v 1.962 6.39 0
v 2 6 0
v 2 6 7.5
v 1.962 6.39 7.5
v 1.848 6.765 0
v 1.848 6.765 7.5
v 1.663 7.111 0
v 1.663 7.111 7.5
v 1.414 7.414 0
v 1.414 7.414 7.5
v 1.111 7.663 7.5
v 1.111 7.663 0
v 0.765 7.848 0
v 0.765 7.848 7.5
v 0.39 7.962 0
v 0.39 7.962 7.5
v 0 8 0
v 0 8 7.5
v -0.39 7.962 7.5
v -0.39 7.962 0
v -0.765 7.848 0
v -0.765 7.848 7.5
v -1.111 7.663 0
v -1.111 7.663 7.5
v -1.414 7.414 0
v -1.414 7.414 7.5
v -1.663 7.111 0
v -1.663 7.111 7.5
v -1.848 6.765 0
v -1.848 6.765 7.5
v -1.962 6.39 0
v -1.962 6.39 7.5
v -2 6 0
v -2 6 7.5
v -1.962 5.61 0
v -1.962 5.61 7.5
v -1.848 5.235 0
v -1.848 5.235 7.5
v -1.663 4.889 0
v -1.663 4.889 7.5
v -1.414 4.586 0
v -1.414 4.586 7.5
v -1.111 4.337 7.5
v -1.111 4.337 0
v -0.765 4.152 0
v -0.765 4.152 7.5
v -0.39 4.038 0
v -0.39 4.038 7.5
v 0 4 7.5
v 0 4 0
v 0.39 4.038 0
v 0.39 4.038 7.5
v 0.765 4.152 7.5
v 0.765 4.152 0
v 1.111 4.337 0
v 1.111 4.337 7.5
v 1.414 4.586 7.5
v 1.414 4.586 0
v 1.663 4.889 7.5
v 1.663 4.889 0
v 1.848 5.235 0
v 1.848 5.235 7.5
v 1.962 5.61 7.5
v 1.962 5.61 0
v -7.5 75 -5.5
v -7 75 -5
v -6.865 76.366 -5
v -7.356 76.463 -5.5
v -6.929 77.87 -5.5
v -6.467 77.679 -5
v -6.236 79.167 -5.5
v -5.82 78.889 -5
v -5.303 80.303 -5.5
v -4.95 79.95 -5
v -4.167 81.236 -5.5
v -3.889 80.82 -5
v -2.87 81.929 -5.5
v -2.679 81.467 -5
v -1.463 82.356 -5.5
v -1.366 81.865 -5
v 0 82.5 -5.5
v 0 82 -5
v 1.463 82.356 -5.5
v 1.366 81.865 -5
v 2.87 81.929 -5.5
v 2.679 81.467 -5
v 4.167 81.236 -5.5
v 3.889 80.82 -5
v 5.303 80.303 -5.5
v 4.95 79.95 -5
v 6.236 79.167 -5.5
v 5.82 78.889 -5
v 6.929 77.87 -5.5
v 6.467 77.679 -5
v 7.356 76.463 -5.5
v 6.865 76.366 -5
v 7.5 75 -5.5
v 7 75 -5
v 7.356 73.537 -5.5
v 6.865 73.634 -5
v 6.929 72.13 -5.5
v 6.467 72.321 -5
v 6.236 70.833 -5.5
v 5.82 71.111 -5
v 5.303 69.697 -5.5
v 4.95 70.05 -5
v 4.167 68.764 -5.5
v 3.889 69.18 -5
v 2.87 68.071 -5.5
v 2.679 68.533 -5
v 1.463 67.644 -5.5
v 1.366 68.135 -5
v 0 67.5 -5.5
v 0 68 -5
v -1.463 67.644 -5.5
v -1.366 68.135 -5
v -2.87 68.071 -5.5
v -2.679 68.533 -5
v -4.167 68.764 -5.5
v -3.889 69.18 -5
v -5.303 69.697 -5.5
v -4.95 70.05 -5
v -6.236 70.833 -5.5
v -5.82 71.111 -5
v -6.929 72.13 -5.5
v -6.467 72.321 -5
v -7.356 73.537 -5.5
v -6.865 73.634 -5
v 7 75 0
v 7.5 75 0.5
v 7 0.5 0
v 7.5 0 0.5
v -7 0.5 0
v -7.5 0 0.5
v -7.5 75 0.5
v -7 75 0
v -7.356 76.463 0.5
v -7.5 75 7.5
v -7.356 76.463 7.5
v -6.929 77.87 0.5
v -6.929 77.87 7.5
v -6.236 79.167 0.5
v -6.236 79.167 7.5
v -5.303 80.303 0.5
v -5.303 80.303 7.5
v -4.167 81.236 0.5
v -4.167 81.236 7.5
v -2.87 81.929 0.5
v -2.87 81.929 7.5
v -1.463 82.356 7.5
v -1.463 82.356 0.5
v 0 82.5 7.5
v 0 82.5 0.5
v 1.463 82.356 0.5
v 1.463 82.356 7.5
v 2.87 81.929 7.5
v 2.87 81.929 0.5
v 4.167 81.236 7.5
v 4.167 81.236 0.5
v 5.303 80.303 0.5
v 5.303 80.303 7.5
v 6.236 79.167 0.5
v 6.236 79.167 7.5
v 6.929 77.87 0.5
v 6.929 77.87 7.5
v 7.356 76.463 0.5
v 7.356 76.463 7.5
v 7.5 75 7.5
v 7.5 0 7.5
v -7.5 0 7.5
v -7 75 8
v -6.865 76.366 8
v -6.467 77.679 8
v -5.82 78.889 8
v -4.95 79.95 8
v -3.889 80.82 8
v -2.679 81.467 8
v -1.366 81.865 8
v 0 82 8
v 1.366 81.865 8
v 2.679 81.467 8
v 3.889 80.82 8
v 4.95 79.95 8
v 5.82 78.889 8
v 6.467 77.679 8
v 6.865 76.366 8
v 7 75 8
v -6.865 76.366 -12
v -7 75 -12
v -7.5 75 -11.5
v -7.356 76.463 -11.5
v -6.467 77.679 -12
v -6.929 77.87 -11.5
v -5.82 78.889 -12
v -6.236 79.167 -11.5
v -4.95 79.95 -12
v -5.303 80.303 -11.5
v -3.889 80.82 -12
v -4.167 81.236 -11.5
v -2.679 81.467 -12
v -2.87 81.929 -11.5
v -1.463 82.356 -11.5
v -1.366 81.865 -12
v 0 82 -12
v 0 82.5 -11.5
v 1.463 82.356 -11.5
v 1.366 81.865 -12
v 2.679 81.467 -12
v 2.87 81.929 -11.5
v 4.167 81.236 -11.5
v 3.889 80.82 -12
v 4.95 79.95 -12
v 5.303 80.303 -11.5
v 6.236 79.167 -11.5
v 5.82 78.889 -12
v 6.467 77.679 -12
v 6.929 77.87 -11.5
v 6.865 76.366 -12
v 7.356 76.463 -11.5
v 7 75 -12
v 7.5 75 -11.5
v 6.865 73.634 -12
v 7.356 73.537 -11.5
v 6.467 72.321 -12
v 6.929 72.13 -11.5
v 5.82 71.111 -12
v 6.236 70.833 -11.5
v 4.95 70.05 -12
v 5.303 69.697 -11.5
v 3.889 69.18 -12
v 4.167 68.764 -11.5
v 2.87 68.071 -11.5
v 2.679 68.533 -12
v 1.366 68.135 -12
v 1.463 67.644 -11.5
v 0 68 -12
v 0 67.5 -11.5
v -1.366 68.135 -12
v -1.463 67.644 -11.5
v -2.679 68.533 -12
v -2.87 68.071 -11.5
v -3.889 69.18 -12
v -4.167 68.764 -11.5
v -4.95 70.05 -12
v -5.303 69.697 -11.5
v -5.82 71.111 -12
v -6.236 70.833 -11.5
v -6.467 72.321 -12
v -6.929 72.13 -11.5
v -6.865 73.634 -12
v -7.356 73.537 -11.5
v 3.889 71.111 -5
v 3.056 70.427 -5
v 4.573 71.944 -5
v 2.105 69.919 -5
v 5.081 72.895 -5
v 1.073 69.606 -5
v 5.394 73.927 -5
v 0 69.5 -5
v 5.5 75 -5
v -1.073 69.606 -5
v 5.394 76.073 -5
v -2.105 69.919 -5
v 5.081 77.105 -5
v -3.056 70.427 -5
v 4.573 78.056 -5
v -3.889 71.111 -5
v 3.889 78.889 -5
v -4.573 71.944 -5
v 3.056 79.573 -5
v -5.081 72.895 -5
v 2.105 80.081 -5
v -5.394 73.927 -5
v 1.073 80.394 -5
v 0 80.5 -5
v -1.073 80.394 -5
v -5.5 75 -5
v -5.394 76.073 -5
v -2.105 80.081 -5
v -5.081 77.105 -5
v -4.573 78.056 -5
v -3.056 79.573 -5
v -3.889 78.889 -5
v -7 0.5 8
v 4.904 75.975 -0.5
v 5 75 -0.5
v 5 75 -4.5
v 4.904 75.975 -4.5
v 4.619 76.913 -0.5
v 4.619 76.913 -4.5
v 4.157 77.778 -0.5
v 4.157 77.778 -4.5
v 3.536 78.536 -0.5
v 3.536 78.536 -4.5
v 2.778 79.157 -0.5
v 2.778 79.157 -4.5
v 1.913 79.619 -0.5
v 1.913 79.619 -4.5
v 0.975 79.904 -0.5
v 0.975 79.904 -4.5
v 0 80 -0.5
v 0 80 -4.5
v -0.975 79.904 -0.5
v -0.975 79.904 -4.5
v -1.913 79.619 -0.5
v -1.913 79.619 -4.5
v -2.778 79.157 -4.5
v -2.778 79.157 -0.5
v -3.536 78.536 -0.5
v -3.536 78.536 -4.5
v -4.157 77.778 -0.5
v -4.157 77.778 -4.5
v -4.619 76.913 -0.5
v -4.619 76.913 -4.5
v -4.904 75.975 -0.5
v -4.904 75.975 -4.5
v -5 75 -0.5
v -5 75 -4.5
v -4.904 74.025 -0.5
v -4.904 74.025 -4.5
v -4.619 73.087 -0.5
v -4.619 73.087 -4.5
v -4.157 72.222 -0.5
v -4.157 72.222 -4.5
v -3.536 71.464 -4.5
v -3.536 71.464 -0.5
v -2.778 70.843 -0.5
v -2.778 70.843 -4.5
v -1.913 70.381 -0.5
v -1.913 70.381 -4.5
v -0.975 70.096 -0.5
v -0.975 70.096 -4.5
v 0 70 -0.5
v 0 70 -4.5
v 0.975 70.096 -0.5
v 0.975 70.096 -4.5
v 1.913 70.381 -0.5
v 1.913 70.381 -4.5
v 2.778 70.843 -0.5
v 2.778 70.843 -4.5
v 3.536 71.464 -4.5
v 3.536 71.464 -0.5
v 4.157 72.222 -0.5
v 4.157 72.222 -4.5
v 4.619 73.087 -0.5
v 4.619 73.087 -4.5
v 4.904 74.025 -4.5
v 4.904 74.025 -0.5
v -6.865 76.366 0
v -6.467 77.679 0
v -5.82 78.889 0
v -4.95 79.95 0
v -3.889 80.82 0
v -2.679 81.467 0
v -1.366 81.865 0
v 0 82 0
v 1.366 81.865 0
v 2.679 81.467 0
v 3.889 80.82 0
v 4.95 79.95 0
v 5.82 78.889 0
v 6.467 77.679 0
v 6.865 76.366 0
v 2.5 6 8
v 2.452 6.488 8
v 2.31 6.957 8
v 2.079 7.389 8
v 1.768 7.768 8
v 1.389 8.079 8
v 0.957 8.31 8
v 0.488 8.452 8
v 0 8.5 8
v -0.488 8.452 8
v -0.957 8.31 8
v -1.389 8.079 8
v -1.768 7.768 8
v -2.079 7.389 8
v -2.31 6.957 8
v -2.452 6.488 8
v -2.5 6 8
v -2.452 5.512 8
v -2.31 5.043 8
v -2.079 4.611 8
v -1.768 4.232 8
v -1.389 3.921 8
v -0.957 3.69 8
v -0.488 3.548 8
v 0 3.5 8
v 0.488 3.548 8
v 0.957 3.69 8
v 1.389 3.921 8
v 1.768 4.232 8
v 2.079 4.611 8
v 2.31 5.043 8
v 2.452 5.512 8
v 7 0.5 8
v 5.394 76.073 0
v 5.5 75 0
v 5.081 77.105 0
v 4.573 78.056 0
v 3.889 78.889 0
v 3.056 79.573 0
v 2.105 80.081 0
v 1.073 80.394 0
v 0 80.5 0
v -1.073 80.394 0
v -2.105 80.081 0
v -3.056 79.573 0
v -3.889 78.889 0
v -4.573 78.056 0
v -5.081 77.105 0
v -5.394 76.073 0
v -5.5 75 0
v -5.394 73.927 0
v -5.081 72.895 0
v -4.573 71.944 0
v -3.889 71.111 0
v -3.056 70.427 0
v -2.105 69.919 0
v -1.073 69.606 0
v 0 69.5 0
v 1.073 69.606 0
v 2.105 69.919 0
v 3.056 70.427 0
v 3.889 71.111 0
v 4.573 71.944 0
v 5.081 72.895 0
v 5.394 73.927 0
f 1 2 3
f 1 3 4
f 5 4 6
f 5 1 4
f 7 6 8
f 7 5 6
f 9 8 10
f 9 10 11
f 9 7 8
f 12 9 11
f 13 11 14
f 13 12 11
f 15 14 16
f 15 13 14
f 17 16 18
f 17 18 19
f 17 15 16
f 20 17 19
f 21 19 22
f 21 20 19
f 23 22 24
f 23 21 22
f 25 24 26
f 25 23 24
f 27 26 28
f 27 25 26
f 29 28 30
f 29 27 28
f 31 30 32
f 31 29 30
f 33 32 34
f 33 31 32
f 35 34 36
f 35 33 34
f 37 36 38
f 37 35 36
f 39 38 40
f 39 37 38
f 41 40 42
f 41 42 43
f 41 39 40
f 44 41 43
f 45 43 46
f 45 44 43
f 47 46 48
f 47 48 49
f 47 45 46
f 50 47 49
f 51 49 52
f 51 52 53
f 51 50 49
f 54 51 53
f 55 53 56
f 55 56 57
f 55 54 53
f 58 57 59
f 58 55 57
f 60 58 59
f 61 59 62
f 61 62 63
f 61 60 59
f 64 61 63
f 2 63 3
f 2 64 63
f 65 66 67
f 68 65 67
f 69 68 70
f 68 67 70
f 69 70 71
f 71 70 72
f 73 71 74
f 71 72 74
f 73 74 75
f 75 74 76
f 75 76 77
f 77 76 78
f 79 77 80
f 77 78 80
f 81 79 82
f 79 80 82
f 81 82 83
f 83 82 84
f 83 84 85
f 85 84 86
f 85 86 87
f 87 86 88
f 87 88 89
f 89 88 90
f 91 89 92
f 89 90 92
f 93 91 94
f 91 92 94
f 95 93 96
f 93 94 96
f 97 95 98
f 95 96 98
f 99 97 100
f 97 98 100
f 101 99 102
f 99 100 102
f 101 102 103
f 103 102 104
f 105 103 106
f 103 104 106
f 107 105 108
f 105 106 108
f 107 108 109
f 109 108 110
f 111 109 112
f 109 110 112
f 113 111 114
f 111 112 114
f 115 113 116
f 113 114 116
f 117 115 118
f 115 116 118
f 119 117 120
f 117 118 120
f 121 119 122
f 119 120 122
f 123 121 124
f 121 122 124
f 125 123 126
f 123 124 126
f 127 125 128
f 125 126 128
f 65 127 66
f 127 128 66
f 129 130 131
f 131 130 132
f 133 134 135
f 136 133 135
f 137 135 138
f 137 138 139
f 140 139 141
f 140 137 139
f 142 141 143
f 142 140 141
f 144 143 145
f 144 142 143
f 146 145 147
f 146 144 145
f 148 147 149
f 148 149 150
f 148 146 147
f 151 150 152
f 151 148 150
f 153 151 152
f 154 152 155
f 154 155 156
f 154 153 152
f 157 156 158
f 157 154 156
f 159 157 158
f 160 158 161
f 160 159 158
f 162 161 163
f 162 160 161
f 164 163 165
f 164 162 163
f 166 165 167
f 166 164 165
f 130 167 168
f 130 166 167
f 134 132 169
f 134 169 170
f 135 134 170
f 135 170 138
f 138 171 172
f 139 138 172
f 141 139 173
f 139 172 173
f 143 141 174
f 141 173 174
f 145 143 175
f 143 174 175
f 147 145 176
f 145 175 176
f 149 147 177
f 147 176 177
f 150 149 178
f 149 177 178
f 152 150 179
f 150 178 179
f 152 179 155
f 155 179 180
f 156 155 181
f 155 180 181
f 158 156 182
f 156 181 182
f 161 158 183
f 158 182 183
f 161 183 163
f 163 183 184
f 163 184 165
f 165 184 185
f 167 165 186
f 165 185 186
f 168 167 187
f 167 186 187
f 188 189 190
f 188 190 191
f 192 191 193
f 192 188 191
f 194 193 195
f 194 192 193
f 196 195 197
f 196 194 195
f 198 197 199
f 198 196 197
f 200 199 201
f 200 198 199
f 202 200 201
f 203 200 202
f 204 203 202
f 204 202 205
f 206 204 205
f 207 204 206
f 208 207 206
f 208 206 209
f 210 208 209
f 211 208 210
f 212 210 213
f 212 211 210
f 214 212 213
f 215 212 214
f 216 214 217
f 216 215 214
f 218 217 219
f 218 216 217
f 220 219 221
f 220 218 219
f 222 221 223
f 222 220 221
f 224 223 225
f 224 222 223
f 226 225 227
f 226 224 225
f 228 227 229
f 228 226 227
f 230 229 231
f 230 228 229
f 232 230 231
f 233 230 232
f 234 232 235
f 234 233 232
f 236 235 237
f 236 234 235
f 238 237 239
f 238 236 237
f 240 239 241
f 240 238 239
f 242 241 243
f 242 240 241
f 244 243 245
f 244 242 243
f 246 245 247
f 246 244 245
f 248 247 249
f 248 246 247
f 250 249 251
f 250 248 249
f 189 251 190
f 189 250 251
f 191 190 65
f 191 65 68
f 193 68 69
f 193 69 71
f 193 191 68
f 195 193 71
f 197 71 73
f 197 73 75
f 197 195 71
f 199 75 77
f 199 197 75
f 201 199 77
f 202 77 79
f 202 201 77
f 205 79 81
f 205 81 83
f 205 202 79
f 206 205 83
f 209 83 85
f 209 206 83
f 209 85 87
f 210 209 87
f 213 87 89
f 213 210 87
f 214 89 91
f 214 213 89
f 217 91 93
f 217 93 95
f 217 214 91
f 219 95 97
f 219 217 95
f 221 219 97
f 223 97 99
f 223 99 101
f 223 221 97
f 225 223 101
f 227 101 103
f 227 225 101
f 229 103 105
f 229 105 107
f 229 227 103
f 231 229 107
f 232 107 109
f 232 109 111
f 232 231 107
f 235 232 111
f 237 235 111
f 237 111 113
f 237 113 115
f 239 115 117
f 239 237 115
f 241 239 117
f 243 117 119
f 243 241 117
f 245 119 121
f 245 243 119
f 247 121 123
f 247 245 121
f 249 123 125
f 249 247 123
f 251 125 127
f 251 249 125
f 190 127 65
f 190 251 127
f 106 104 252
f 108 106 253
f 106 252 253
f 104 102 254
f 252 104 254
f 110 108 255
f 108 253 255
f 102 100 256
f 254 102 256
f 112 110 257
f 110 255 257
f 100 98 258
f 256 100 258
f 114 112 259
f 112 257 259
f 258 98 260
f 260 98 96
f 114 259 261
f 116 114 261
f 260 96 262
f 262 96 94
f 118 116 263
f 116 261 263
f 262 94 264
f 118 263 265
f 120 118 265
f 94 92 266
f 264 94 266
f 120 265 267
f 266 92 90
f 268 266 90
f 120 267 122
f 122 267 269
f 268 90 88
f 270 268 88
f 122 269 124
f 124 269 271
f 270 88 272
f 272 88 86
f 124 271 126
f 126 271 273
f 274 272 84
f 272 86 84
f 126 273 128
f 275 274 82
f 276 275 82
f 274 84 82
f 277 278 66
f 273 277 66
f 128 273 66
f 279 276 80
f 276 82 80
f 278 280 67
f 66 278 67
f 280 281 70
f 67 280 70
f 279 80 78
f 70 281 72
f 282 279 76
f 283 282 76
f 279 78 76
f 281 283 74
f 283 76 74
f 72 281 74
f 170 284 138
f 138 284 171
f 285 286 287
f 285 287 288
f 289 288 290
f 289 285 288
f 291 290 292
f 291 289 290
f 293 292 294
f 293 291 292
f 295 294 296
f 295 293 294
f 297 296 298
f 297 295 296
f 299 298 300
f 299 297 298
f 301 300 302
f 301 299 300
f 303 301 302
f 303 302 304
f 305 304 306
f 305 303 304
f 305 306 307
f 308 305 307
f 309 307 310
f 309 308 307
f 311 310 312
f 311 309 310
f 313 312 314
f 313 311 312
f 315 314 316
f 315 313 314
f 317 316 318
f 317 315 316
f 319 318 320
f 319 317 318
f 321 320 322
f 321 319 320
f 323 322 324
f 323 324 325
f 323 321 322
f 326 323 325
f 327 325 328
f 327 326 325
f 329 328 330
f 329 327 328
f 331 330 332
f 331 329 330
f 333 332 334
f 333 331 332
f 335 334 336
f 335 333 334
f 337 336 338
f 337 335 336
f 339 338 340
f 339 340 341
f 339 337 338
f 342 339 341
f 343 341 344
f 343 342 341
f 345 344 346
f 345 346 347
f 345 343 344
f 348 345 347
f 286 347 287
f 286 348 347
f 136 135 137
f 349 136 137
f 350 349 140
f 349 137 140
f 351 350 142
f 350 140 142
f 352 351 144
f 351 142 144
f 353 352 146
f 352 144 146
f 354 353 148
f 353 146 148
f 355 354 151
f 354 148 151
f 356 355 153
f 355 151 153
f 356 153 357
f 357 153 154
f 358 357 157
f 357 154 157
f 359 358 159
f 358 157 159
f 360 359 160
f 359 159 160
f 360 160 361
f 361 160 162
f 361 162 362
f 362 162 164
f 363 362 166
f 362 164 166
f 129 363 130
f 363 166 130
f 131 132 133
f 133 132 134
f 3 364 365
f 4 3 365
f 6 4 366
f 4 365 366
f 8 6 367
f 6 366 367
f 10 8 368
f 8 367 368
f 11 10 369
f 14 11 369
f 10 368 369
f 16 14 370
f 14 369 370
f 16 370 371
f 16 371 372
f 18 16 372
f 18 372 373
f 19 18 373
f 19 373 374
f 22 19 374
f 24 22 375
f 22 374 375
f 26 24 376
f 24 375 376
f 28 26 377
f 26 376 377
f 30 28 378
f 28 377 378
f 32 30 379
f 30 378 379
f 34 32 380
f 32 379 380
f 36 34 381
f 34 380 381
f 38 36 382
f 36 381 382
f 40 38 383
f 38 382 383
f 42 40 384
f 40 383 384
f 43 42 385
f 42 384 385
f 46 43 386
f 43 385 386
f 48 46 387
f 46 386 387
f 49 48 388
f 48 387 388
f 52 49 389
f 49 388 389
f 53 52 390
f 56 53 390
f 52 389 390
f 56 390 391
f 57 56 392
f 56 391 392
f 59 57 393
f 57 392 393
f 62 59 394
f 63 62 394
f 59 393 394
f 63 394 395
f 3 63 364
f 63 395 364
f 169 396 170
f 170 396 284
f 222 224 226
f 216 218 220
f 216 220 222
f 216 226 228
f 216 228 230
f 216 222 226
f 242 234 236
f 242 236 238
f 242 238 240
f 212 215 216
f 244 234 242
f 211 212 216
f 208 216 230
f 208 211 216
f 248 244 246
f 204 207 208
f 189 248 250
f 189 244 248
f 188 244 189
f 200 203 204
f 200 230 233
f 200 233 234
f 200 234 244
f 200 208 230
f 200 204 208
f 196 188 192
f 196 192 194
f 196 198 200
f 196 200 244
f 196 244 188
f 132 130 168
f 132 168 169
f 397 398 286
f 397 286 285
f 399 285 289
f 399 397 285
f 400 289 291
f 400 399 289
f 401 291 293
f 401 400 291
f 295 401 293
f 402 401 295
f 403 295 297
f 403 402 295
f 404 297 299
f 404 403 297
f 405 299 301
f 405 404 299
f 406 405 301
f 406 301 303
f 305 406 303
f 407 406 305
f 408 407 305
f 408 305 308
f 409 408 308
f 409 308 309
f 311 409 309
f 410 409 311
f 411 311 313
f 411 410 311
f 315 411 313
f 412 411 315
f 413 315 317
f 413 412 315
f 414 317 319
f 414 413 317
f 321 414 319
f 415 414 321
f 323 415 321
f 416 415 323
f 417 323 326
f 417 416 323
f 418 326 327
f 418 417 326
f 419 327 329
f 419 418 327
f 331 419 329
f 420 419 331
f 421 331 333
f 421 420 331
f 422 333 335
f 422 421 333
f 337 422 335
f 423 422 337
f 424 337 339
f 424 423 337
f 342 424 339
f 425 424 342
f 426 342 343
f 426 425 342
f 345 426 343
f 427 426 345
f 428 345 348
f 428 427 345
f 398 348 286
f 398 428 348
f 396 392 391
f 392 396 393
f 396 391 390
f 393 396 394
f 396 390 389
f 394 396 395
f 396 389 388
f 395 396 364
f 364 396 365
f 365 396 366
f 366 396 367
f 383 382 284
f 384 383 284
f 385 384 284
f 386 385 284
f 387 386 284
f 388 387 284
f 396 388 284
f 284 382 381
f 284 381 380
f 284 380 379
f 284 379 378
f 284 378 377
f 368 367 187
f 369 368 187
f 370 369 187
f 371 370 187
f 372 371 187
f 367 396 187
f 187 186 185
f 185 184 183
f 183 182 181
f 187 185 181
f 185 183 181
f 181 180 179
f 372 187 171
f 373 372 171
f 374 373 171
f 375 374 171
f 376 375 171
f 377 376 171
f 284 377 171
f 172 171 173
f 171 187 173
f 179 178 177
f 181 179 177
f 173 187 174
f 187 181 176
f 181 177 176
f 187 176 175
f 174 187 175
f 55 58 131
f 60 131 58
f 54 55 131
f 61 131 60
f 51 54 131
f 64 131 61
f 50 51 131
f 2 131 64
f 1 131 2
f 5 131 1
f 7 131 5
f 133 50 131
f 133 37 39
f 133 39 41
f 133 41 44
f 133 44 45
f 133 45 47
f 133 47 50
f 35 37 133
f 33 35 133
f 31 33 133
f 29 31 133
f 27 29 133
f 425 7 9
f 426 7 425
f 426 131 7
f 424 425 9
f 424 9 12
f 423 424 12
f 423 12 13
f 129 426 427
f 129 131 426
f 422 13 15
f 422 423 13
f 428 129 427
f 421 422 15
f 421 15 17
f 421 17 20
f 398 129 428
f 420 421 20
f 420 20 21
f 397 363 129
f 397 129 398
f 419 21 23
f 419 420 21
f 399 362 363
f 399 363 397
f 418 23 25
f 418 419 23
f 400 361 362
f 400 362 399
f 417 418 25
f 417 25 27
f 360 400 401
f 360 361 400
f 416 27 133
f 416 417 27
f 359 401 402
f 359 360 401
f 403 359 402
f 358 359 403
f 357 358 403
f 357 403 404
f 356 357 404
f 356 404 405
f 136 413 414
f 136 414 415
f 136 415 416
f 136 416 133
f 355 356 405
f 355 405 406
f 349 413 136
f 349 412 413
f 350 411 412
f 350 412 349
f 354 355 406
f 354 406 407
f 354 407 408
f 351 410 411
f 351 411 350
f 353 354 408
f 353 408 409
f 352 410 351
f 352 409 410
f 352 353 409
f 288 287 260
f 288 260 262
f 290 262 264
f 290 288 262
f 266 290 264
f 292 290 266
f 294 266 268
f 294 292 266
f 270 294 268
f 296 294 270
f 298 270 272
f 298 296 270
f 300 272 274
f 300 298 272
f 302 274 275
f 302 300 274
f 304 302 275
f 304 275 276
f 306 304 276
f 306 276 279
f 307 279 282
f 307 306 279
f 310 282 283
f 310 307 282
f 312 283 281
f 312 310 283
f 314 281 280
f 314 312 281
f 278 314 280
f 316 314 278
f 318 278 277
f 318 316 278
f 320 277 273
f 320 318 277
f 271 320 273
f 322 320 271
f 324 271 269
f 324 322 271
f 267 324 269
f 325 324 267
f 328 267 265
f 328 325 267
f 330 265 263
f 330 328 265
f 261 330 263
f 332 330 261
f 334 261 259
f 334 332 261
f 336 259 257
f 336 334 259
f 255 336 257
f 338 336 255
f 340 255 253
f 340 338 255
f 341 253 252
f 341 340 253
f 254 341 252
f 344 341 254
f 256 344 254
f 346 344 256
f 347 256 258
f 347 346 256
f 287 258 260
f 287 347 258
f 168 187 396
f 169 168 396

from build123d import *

# Parameters (mm, degrees)
SKETCH3_R           = 2
BOSS_EXTRUDE1_DEPTH = 8
SKETCH4_R           = 5
BOSS_EXTRUDE2_DEPTH = 5
BOSS_EXTRUDE3_START = 7
SKETCH5_R           = 7.5
BOSS_EXTRUDE3_DEPTH = 7
CHAMFER1_SIZE       = 0.5


with BuildPart() as part:
    # Sketch3 → Boss-Extrude1 (new body)
    with BuildSketch(Plane.XY):
        with BuildLine():
            Line((7.5, 75), (7.5, 0))
            Line((7.5, 0), (-7.5, 0))
            Line((-7.5, 0), (-7.5, 75))
            ThreePointArc((-7.5, 75), (0, 82.5), (7.5, 75))
        make_face()
        with Locations((0, 6)):
            Circle(SKETCH3_R, mode=Mode.SUBTRACT)
    extrude(amount=BOSS_EXTRUDE1_DEPTH)

    # Sketch4 → Boss-Extrude2 (add)
    with BuildSketch(Plane.XY):
        with Locations((0, 75)):
            Circle(SKETCH4_R)
    extrude(amount=-BOSS_EXTRUDE2_DEPTH)

    # Sketch5 → Boss-Extrude3 (add)
    with BuildSketch(Plane(origin=(0, 0, -5), x_dir=(-1, 0, 0), z_dir=(0, 0, -1)).offset(BOSS_EXTRUDE3_START)):
        with Locations((0, 75)):
            Circle(SKETCH5_R)
    extrude(amount=-BOSS_EXTRUDE3_DEPTH)

    # Chamfer1
    chamfer1_edges = [part.edges().sort_by_distance(p)[0] for p in [
        (-2, 6, 8),
        (7.5, 37.5, 8),
        (0, 82.5, 8),
        (-5, 75, 0),
        (-5, 75, -5),
        (7.5, 75, -5),
        (7.5, 75, -12),
        (-7.5, 37.5, 8),
        (0, 82.5, 0),
        (7.5, 37.5, 0),
        (0, 0, 0),
        (-7.5, 37.5, 0),
        (0, 0, 8),
    ]]
    chamfer(chamfer1_edges, length=CHAMFER1_SIZE)


solid = part.part
